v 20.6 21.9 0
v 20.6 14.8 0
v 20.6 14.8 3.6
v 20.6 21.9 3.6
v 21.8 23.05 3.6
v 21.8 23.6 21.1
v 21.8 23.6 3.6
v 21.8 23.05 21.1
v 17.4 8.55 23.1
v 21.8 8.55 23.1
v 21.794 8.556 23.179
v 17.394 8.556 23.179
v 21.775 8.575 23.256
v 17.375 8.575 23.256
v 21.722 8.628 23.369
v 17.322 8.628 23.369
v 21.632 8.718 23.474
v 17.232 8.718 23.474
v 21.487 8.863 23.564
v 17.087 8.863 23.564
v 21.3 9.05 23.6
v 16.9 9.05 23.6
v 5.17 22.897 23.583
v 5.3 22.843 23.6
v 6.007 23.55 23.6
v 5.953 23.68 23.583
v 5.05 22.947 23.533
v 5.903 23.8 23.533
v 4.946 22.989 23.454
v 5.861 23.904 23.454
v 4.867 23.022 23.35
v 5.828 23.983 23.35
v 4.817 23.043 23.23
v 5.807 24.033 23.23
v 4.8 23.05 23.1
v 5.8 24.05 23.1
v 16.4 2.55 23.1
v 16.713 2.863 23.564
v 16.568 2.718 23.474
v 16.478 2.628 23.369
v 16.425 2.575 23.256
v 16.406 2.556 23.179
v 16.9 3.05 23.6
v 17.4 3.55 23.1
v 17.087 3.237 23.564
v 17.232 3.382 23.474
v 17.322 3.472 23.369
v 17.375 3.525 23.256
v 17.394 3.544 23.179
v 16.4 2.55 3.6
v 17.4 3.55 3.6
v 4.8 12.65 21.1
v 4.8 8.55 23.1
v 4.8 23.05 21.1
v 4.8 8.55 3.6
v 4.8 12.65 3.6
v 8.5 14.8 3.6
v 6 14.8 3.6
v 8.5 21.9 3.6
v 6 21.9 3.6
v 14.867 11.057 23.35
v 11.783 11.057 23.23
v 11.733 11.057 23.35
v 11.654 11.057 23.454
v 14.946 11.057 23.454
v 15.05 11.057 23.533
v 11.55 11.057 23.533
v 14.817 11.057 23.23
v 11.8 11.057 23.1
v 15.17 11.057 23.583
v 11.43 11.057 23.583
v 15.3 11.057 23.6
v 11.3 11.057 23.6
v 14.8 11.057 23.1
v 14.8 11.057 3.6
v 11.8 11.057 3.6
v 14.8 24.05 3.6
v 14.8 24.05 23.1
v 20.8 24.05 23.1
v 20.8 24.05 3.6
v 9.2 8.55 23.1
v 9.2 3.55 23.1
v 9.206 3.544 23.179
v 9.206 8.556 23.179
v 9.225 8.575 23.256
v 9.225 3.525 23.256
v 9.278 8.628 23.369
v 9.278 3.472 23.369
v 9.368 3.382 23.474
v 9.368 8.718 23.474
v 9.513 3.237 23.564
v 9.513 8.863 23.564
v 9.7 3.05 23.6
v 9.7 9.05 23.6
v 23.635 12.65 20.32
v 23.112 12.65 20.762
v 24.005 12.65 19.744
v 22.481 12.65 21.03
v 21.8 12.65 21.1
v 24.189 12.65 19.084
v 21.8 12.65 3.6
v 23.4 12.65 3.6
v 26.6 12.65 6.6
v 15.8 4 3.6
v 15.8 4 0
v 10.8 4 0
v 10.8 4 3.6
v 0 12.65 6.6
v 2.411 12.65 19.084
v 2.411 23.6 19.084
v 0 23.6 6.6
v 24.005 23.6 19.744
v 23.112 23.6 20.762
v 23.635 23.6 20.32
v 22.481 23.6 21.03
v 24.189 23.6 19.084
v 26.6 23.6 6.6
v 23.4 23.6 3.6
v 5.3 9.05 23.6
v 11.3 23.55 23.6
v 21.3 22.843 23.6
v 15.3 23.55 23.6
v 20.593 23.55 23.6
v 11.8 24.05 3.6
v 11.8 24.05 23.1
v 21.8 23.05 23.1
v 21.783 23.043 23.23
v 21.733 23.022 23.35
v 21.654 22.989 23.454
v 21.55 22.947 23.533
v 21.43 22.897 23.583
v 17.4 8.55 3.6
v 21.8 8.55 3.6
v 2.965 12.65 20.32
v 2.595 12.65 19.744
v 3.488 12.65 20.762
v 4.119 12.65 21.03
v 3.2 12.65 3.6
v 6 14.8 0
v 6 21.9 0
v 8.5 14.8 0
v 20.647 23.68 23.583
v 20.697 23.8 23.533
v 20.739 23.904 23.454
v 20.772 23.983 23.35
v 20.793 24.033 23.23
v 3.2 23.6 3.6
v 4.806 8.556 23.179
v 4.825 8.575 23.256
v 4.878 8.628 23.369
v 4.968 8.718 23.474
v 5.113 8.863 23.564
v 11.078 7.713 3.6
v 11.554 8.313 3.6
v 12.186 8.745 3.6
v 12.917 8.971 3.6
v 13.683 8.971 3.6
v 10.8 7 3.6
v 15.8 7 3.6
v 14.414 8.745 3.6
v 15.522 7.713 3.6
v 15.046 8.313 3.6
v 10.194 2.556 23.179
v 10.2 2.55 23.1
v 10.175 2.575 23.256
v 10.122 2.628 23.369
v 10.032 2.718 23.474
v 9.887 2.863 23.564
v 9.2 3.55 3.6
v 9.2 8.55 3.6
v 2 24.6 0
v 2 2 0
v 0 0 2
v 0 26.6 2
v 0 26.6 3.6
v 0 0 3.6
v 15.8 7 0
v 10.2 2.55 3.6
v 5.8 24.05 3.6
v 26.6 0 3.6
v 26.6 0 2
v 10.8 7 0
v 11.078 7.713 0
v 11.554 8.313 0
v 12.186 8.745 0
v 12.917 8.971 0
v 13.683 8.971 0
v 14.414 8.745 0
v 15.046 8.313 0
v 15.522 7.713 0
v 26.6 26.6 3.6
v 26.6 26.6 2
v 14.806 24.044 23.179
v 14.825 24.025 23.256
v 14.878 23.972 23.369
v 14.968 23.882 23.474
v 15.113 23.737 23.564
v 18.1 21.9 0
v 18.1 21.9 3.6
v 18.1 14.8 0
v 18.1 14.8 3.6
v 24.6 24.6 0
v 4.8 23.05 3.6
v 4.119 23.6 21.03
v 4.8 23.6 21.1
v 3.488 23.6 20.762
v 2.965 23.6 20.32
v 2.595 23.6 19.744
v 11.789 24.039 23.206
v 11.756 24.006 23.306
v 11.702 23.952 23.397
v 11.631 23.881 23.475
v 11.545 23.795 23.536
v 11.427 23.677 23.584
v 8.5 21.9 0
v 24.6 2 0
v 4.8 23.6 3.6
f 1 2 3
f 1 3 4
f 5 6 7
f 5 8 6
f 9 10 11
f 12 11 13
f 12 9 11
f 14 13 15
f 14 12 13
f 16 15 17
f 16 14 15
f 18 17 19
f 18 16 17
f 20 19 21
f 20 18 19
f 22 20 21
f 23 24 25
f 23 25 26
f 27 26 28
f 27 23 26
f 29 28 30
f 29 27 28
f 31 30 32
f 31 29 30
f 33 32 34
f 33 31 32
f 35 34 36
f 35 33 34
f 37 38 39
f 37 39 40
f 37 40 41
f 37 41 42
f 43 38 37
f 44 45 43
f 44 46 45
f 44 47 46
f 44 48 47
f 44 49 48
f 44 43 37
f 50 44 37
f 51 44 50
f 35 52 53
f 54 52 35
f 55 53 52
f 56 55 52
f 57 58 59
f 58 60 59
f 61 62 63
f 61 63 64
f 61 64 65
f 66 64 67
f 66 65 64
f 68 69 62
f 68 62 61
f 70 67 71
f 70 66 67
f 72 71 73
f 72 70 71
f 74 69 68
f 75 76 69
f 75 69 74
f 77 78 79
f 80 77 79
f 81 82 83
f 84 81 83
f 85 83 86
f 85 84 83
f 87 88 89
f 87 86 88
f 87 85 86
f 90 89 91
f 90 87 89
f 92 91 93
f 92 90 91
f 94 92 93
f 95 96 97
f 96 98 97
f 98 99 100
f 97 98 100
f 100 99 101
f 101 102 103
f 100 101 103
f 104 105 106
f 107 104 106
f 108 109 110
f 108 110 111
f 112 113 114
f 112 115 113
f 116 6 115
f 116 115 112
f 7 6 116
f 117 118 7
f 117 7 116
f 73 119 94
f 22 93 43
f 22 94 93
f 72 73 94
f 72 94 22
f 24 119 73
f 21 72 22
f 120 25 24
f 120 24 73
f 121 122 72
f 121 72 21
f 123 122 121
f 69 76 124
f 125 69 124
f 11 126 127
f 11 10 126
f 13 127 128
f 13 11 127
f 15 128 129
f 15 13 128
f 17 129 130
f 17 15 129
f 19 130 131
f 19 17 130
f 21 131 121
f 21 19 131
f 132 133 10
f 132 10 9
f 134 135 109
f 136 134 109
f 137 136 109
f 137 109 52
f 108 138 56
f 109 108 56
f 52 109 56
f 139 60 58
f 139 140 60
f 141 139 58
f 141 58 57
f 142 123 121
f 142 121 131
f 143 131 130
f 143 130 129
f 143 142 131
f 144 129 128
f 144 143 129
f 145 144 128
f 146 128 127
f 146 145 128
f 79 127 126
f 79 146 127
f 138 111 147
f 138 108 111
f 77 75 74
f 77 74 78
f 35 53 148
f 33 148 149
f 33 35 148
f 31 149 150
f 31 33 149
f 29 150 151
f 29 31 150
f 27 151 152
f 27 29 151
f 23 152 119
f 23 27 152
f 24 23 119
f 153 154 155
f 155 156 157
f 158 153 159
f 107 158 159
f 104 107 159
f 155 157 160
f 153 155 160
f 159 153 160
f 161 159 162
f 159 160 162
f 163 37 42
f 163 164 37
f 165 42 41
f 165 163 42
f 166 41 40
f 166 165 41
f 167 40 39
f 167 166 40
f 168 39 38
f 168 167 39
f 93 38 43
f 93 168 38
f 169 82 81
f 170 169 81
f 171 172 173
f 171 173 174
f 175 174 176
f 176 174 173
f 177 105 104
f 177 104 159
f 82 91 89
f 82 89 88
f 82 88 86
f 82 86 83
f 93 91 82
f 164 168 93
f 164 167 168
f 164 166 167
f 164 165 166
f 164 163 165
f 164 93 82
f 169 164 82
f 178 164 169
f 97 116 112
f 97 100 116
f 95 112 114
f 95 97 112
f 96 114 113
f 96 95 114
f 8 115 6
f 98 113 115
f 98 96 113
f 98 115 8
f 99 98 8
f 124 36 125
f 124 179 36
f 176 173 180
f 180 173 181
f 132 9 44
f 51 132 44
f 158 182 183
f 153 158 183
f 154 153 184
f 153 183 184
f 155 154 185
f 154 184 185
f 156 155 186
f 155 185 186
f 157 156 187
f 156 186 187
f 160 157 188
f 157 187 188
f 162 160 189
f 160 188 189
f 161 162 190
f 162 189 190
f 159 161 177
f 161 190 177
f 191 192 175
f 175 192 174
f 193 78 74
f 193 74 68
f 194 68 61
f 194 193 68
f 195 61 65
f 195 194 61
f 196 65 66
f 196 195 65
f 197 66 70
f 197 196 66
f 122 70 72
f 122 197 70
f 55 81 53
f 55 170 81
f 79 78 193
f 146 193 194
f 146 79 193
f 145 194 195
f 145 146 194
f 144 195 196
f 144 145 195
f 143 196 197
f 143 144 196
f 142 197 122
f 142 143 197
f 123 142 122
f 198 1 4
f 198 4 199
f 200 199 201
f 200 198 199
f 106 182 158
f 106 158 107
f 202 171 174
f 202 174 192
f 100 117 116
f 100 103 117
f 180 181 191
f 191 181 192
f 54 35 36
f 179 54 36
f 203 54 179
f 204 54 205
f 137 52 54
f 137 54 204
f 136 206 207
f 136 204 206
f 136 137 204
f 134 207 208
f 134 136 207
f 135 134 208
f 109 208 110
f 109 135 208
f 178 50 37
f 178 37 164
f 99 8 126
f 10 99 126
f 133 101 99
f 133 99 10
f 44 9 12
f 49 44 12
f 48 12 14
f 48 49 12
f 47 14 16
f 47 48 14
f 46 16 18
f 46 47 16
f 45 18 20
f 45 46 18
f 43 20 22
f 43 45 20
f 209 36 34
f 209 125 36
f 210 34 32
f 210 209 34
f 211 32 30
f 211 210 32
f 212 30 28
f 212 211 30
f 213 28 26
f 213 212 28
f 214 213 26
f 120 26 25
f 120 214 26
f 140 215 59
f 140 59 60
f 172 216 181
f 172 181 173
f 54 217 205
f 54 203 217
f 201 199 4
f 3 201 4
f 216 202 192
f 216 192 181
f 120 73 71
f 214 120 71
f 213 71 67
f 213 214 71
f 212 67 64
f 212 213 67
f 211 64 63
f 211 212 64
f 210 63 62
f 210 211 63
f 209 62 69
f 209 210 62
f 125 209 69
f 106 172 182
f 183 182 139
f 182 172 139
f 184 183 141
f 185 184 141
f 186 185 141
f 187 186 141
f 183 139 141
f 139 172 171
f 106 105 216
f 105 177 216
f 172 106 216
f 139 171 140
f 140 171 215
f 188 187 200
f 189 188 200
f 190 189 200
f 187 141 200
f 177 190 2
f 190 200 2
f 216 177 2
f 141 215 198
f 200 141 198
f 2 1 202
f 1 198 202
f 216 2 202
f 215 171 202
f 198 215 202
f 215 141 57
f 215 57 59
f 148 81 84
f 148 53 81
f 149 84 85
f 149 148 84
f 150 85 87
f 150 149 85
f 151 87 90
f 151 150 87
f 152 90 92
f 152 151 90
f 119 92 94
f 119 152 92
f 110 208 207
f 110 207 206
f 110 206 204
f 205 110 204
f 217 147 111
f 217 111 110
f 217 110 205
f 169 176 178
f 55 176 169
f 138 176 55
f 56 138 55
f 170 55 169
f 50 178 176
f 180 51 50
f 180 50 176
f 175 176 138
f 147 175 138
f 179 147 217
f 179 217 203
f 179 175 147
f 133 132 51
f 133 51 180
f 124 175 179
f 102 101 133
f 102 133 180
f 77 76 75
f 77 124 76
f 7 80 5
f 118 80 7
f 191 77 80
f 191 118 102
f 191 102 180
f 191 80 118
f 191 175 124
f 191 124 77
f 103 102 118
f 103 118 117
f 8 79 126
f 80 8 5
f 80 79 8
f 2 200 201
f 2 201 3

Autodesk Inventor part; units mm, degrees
ref_plane "YZ Plane" through (0, 0, 0) normal (1, 0, 0) x (0, 1, 0)
ref_plane "XZ Plane" through (0, 0, 0) normal (0, 1, 0) x (-1, 0, 0)
ref_plane "XY Plane" through (0, 0, 0) normal (0, 0, 1) x (1, 0, 0)
sketch "Sketch1" plane through (0, 0, 0) normal (0, 0, 1) x (1, 0, 0)
  line L0 (0, 0) -> (26.6, 0)
  line L1 (26.6, 0) -> (26.6, 26.6)
  line L2 (26.6, 26.6) -> (0, 26.6)
  line L3 (0, 26.6) -> (0, 0)
  dimension "d0" = 26.6
  dimension "d1" = 26.6
extrude "Extrusion1" add sketch "Sketch1" along normal blind 3.6
chamfer "Chamfer1" distance 2 angle 45 4 edges at (13.3, 26.6, 0) (0, 13.3, 0) (26.6, 13.3, 0) (13.3, 0, 0)
sketch "Sketch2" plane through (0, 0, 0) normal (0, 0, -1) x (-1, 0, 0)
  line L0 (0, 26.6) -> (0, 0) construction
  line L1 (0, 20.5614) -> (-6, 20.5614) construction
  line L2 (-26.6, 26.6) -> (0, 26.6) construction
  line L3 (-7.1317, 26.6) -> (-7.1317, 21.9) construction
  line L4 (-7.1317, 26.6) -> (-2.4317, 26.6) construction
  line L5 (-6, 21.9) -> (-8.5, 21.9) construction
  line L6 (-8.5, 21.9) -> (-8.5, 14.8) construction
  line L7 (-8.5, 14.8) -> (-6, 14.8) construction
  line L8 (-6, 14.8) -> (-6, 21.9) construction
  line L9 (-13.3, 26.6) -> (-13.3, 0) construction
  line L10 (0, 0) -> (-26.6, 0) construction
  line L11 (-20.6, 21.9) -> (-18.1, 21.9) construction
  line L12 (-18.1, 21.9) -> (-18.1, 14.8) construction
  line L13 (-18.1, 14.8) -> (-20.6, 14.8) construction
  line L14 (-20.6, 14.8) -> (-20.6, 21.9) construction
  line L15 (-13.3, 0) -> (-13.3, 4) construction
  line L16 (-13.3, 4) -> (-10.8, 4) construction
  line L17 (-10.8, 4) -> (-15.8, 4) construction
  line L18 (-15.8, 4) -> (-15.8, 9) construction
  line L19 (-15.8, 9) -> (-10.8, 9) construction
  line L20 (-10.8, 9) -> (-10.8, 4) construction
  line L21 (-15.8, 4) -> (-15.8, 7) construction
  line L22 (-10.8, 4) -> (-10.8, 7) construction
  arc A0 (-10.8, 7) -> (-15.8, 7) centre (-13.3, 6.4375) ccw construction
  line L23 (-20.6, 21.9) -> (-18.1, 21.9)
  line L24 (-18.1, 21.9) -> (-18.1, 14.8)
  line L25 (-18.1, 14.8) -> (-20.6, 14.8)
  line L26 (-20.6, 14.8) -> (-20.6, 21.9)
  line L27 (-8.5, 21.9) -> (-6, 21.9)
  line L28 (-6, 21.9) -> (-6, 14.8)
  line L29 (-6, 14.8) -> (-8.5, 14.8)
  line L30 (-8.5, 14.8) -> (-8.5, 21.9)
  line L31 (-15.8, 4) -> (-10.8, 4)
  line L32 (-10.8, 7) -> (-10.8, 4)
  line L33 (-15.8, 4) -> (-15.8, 7)
  arc A1 (-10.8, 7) -> (-15.8, 7) centre (-13.3, 6.4375) ccw
  dimension "d7" = 6
  dimension "d9" = 4.7
  dimension "d11" = 2.5
  dimension "d12" = 7.1
  dimension "d13" = 4
  dimension "d14" = 2.5
  dimension "d15" = 5
  dimension "d16" = 5
  dimension "d17" = 3
extrude "Extrusion2" cut sketch "Sketch2" against normal blind 3.6
sketch "Sketch3" plane through (0, 0, 3.6) normal (0, 0, 1) x (1, 0, 0)
  line L0 (15.8, 4) -> (10.8, 4) construction
  line L1 (10.8, 4) -> (10.8, 7) construction
  arc A0 (15.8, 7) -> (10.8, 7) centre (13.3, 6.4375) ccw construction
  line L2 (15.8, 7) -> (15.8, 4) construction
  line L3 (6, 14.8) -> (6, 21.9) construction
  line L4 (6, 21.9) -> (8.5, 21.9) construction
  line L5 (8.5, 21.9) -> (8.5, 14.8) construction
  line L6 (8.5, 14.8) -> (6, 14.8) construction
  line L7 (18.1, 14.8) -> (18.1, 21.9) construction
  line L8 (18.1, 21.9) -> (20.6, 21.9) construction
  line L9 (20.6, 21.9) -> (20.6, 14.8) construction
  line L10 (20.6, 14.8) -> (18.1, 14.8) construction
  line L11 (26.6, 0) -> (26.6, 26.6) construction
  line L12 (26.6, 26.6) -> (0, 26.6) construction
  line L13 (0, 26.6) -> (0, 0) construction
  line L14 (0, 0) -> (26.6, 0) construction
  line L15 (13.3, 26.6) -> (13.3, 0) construction
  line L16 (4.8, 2.55) -> (21.8, 2.55) construction
  line L17 (21.8, 2.55) -> (21.8, 24.05) construction
  line L18 (21.8, 24.05) -> (4.8, 24.05) construction
  line L19 (4.8, 24.05) -> (4.8, 2.55) construction
  line L20 (4.8, 2.55) -> (21.8, 24.05) construction
  line L21 (21.8, 2.55) -> (4.8, 24.05) construction
  line L22 (21.8, 2.55) -> (17.4, 2.55) construction
  line L23 (17.4, 2.55) -> (17.4, 8.55) construction
  line L24 (17.4, 8.55) -> (21.8, 8.55) construction
  line L25 (21.8, 8.55) -> (21.8, 2.55) construction
  line L26 (4.8, 2.55) -> (9.2, 2.55) construction
  line L27 (9.2, 2.55) -> (9.2, 8.55) construction
  line L28 (9.2, 8.55) -> (4.8, 8.55) construction
  line L29 (4.8, 8.55) -> (4.8, 2.55) construction
  line L30 (11.8, 37.0426) -> (14.8, 37.0426) construction
  line L31 (14.8, 37.0426) -> (14.8, 11.0574) construction
  line L32 (14.8, 11.0574) -> (11.8, 11.0574) construction
  line L33 (11.8, 11.0574) -> (11.8, 37.0426) construction
  line L34 (11.8, 37.0426) -> (14.8, 11.0574) construction
  line L35 (14.8, 37.0426) -> (11.8, 11.0574) construction
  line L36 (4.8, 24.05) -> (11.8, 24.05)
  line L37 (11.8, 11.0574) -> (11.8, 24.05)
  line L38 (11.8, 11.0574) -> (14.8, 11.0574)
  line L39 (14.8, 11.0574) -> (14.8, 24.05)
  line L40 (14.8, 24.05) -> (21.8, 24.05)
  line L41 (21.8, 24.05) -> (21.8, 8.55)
  line L42 (21.8, 8.55) -> (17.4, 8.55)
  line L43 (17.4, 8.55) -> (17.4, 2.55)
  line L44 (17.4, 2.55) -> (9.2, 2.55)
  line L45 (9.2, 2.55) -> (9.2, 8.55)
  line L46 (9.2, 8.55) -> (4.8, 8.55)
  line L47 (4.8, 8.55) -> (4.8, 24.05)
  point P0 (13.3, 13.3)
  point P1 (13.3, 24.05)
  dimension "d20" = 17
  dimension "d21" = 21.5
  dimension "d22" = 4.4
  dimension "d23" = 6
  dimension "d24" = 4.4
  dimension "d25" = 6
  dimension "d26" = 3
extrude "Extrusion3" add sketch "Sketch3" along normal blind 20
chamfer "Chamfer2" distance 1 angle 45 4 edges at (4.8, 24.05, 13.6) (21.8, 24.05, 13.6) (17.4, 2.55, 13.6) (9.2, 2.55, 13.6)
fillet "Fillet1" radius 0.5 13 edges at (8.8, 24.05, 23.6) (4.8, 15.8, 23.6) (11.8, 17.5537, 23.6) (14.8, 17.5537, 23.6) (17.8, 24.05, 23.6) (21.8, 15.8, 23.6) (19.6, 8.55, 23.6) (17.4, 6.05, 23.6) (9.2, 6.05, 23.6) (7, 8.55, 23.6) (13.3, 2.55, 23.6) (21.3, 23.55, 23.6) (5.3, 23.55, 23.6)
ref_plane "Work Plane1" through (14.8, 16.3, 3.6) normal (0, 1, 0) x (1, 0, 0)
sketch "Sketch4" plane through (14.8, 16.3, 3.6) normal (0, 1, 0) x (1, 0, 0)
  line L0 (-10, 0) -> (-10, -19.5) construction
  line L1 (11.8, 0) -> (-14.8, 0) construction
  line L2 (-8.7929, -20) -> (-3.5, -20) construction
  arc A0 (-3.5, -20) -> (-3, -19.5) centre (-3.5, -19.5) ccw construction
  line L3 (-3, -19.5) -> (-9, -19.5) construction
  ellipse E0 centre (-8.7929, -19.5) end of major axis (-8.7929, -20) minor radius 0.2071 (-9, -19.5) -> (-8.7929, -20) ccw construction
  line L4 (-9.5, -20) -> (-8.7929, -20) construction
  ellipse E1 centre (-8.7929, -19.5) end of major axis (-8.7929, -20) minor radius 0.2071 (-9, -19.5) -> (-8.7929, -20) ccw construction
  line L5 (-9, -19.5) -> (-10, -19.5) construction
  arc A1 (-10, -19.5) -> (-9.5, -20) centre (-9.5, -19.5) ccw construction
  line L6 (-7.8516, -20) -> (-7.8516, -17.5) construction
  line L7 (-7.8516, -17.5) -> (-16.9269, -17.5) construction
  line L8 (-10, -3.8087) -> (-15, -3.8087) construction
  line L9 (-14.8, 0) -> (-14.8, -3) construction
  line L10 (-10, 0) -> (-11.6, 0) construction
  line L11 (-11.6, 0) -> (-14.8, -3) construction
  line L12 (-10, -17.5) -> (-12, -17.5) construction
  line L13 (-12, -17.5) -> (-14.8, -3) construction
  arc A2 (-12.3892, -15.4843) -> (-10, -17.5) centre (-10.1078, -15.204) ccw construction
  arc A3 (-12.3892, -15.4843) -> (-10, -17.5) centre (-10.1078, -15.204) ccw
  line L14 (-12.3892, -15.4843) -> (-14.8, -3)
  line L15 (-14.8, -3) -> (-11.6, 0)
  line L16 (-11.6, 0) -> (-10, 0)
  line L17 (-10, 0) -> (-10, -17.5)
  point P0 (-14.8, 3.6)
  dimension "d33" = 2.5
  dimension "d34" = 5
  dimension "d35" = 3
  dimension "d36" = 1.6
  dimension "d37" = 2
extrude "Extrusion4" add sketch "Sketch4" along normal blind 7.3 and the other way blind 3.65
ref_plane "Work Plane2" through (13.3, 11.0574, 3.6) normal (-1, 0, 0) x (0, 0, 1)
mirror "Mirror1" about plane through (13.3, 11.0574, 3.6) normal (-1, 0, 0) of "Extrusion4"
properties part number "Plug"
